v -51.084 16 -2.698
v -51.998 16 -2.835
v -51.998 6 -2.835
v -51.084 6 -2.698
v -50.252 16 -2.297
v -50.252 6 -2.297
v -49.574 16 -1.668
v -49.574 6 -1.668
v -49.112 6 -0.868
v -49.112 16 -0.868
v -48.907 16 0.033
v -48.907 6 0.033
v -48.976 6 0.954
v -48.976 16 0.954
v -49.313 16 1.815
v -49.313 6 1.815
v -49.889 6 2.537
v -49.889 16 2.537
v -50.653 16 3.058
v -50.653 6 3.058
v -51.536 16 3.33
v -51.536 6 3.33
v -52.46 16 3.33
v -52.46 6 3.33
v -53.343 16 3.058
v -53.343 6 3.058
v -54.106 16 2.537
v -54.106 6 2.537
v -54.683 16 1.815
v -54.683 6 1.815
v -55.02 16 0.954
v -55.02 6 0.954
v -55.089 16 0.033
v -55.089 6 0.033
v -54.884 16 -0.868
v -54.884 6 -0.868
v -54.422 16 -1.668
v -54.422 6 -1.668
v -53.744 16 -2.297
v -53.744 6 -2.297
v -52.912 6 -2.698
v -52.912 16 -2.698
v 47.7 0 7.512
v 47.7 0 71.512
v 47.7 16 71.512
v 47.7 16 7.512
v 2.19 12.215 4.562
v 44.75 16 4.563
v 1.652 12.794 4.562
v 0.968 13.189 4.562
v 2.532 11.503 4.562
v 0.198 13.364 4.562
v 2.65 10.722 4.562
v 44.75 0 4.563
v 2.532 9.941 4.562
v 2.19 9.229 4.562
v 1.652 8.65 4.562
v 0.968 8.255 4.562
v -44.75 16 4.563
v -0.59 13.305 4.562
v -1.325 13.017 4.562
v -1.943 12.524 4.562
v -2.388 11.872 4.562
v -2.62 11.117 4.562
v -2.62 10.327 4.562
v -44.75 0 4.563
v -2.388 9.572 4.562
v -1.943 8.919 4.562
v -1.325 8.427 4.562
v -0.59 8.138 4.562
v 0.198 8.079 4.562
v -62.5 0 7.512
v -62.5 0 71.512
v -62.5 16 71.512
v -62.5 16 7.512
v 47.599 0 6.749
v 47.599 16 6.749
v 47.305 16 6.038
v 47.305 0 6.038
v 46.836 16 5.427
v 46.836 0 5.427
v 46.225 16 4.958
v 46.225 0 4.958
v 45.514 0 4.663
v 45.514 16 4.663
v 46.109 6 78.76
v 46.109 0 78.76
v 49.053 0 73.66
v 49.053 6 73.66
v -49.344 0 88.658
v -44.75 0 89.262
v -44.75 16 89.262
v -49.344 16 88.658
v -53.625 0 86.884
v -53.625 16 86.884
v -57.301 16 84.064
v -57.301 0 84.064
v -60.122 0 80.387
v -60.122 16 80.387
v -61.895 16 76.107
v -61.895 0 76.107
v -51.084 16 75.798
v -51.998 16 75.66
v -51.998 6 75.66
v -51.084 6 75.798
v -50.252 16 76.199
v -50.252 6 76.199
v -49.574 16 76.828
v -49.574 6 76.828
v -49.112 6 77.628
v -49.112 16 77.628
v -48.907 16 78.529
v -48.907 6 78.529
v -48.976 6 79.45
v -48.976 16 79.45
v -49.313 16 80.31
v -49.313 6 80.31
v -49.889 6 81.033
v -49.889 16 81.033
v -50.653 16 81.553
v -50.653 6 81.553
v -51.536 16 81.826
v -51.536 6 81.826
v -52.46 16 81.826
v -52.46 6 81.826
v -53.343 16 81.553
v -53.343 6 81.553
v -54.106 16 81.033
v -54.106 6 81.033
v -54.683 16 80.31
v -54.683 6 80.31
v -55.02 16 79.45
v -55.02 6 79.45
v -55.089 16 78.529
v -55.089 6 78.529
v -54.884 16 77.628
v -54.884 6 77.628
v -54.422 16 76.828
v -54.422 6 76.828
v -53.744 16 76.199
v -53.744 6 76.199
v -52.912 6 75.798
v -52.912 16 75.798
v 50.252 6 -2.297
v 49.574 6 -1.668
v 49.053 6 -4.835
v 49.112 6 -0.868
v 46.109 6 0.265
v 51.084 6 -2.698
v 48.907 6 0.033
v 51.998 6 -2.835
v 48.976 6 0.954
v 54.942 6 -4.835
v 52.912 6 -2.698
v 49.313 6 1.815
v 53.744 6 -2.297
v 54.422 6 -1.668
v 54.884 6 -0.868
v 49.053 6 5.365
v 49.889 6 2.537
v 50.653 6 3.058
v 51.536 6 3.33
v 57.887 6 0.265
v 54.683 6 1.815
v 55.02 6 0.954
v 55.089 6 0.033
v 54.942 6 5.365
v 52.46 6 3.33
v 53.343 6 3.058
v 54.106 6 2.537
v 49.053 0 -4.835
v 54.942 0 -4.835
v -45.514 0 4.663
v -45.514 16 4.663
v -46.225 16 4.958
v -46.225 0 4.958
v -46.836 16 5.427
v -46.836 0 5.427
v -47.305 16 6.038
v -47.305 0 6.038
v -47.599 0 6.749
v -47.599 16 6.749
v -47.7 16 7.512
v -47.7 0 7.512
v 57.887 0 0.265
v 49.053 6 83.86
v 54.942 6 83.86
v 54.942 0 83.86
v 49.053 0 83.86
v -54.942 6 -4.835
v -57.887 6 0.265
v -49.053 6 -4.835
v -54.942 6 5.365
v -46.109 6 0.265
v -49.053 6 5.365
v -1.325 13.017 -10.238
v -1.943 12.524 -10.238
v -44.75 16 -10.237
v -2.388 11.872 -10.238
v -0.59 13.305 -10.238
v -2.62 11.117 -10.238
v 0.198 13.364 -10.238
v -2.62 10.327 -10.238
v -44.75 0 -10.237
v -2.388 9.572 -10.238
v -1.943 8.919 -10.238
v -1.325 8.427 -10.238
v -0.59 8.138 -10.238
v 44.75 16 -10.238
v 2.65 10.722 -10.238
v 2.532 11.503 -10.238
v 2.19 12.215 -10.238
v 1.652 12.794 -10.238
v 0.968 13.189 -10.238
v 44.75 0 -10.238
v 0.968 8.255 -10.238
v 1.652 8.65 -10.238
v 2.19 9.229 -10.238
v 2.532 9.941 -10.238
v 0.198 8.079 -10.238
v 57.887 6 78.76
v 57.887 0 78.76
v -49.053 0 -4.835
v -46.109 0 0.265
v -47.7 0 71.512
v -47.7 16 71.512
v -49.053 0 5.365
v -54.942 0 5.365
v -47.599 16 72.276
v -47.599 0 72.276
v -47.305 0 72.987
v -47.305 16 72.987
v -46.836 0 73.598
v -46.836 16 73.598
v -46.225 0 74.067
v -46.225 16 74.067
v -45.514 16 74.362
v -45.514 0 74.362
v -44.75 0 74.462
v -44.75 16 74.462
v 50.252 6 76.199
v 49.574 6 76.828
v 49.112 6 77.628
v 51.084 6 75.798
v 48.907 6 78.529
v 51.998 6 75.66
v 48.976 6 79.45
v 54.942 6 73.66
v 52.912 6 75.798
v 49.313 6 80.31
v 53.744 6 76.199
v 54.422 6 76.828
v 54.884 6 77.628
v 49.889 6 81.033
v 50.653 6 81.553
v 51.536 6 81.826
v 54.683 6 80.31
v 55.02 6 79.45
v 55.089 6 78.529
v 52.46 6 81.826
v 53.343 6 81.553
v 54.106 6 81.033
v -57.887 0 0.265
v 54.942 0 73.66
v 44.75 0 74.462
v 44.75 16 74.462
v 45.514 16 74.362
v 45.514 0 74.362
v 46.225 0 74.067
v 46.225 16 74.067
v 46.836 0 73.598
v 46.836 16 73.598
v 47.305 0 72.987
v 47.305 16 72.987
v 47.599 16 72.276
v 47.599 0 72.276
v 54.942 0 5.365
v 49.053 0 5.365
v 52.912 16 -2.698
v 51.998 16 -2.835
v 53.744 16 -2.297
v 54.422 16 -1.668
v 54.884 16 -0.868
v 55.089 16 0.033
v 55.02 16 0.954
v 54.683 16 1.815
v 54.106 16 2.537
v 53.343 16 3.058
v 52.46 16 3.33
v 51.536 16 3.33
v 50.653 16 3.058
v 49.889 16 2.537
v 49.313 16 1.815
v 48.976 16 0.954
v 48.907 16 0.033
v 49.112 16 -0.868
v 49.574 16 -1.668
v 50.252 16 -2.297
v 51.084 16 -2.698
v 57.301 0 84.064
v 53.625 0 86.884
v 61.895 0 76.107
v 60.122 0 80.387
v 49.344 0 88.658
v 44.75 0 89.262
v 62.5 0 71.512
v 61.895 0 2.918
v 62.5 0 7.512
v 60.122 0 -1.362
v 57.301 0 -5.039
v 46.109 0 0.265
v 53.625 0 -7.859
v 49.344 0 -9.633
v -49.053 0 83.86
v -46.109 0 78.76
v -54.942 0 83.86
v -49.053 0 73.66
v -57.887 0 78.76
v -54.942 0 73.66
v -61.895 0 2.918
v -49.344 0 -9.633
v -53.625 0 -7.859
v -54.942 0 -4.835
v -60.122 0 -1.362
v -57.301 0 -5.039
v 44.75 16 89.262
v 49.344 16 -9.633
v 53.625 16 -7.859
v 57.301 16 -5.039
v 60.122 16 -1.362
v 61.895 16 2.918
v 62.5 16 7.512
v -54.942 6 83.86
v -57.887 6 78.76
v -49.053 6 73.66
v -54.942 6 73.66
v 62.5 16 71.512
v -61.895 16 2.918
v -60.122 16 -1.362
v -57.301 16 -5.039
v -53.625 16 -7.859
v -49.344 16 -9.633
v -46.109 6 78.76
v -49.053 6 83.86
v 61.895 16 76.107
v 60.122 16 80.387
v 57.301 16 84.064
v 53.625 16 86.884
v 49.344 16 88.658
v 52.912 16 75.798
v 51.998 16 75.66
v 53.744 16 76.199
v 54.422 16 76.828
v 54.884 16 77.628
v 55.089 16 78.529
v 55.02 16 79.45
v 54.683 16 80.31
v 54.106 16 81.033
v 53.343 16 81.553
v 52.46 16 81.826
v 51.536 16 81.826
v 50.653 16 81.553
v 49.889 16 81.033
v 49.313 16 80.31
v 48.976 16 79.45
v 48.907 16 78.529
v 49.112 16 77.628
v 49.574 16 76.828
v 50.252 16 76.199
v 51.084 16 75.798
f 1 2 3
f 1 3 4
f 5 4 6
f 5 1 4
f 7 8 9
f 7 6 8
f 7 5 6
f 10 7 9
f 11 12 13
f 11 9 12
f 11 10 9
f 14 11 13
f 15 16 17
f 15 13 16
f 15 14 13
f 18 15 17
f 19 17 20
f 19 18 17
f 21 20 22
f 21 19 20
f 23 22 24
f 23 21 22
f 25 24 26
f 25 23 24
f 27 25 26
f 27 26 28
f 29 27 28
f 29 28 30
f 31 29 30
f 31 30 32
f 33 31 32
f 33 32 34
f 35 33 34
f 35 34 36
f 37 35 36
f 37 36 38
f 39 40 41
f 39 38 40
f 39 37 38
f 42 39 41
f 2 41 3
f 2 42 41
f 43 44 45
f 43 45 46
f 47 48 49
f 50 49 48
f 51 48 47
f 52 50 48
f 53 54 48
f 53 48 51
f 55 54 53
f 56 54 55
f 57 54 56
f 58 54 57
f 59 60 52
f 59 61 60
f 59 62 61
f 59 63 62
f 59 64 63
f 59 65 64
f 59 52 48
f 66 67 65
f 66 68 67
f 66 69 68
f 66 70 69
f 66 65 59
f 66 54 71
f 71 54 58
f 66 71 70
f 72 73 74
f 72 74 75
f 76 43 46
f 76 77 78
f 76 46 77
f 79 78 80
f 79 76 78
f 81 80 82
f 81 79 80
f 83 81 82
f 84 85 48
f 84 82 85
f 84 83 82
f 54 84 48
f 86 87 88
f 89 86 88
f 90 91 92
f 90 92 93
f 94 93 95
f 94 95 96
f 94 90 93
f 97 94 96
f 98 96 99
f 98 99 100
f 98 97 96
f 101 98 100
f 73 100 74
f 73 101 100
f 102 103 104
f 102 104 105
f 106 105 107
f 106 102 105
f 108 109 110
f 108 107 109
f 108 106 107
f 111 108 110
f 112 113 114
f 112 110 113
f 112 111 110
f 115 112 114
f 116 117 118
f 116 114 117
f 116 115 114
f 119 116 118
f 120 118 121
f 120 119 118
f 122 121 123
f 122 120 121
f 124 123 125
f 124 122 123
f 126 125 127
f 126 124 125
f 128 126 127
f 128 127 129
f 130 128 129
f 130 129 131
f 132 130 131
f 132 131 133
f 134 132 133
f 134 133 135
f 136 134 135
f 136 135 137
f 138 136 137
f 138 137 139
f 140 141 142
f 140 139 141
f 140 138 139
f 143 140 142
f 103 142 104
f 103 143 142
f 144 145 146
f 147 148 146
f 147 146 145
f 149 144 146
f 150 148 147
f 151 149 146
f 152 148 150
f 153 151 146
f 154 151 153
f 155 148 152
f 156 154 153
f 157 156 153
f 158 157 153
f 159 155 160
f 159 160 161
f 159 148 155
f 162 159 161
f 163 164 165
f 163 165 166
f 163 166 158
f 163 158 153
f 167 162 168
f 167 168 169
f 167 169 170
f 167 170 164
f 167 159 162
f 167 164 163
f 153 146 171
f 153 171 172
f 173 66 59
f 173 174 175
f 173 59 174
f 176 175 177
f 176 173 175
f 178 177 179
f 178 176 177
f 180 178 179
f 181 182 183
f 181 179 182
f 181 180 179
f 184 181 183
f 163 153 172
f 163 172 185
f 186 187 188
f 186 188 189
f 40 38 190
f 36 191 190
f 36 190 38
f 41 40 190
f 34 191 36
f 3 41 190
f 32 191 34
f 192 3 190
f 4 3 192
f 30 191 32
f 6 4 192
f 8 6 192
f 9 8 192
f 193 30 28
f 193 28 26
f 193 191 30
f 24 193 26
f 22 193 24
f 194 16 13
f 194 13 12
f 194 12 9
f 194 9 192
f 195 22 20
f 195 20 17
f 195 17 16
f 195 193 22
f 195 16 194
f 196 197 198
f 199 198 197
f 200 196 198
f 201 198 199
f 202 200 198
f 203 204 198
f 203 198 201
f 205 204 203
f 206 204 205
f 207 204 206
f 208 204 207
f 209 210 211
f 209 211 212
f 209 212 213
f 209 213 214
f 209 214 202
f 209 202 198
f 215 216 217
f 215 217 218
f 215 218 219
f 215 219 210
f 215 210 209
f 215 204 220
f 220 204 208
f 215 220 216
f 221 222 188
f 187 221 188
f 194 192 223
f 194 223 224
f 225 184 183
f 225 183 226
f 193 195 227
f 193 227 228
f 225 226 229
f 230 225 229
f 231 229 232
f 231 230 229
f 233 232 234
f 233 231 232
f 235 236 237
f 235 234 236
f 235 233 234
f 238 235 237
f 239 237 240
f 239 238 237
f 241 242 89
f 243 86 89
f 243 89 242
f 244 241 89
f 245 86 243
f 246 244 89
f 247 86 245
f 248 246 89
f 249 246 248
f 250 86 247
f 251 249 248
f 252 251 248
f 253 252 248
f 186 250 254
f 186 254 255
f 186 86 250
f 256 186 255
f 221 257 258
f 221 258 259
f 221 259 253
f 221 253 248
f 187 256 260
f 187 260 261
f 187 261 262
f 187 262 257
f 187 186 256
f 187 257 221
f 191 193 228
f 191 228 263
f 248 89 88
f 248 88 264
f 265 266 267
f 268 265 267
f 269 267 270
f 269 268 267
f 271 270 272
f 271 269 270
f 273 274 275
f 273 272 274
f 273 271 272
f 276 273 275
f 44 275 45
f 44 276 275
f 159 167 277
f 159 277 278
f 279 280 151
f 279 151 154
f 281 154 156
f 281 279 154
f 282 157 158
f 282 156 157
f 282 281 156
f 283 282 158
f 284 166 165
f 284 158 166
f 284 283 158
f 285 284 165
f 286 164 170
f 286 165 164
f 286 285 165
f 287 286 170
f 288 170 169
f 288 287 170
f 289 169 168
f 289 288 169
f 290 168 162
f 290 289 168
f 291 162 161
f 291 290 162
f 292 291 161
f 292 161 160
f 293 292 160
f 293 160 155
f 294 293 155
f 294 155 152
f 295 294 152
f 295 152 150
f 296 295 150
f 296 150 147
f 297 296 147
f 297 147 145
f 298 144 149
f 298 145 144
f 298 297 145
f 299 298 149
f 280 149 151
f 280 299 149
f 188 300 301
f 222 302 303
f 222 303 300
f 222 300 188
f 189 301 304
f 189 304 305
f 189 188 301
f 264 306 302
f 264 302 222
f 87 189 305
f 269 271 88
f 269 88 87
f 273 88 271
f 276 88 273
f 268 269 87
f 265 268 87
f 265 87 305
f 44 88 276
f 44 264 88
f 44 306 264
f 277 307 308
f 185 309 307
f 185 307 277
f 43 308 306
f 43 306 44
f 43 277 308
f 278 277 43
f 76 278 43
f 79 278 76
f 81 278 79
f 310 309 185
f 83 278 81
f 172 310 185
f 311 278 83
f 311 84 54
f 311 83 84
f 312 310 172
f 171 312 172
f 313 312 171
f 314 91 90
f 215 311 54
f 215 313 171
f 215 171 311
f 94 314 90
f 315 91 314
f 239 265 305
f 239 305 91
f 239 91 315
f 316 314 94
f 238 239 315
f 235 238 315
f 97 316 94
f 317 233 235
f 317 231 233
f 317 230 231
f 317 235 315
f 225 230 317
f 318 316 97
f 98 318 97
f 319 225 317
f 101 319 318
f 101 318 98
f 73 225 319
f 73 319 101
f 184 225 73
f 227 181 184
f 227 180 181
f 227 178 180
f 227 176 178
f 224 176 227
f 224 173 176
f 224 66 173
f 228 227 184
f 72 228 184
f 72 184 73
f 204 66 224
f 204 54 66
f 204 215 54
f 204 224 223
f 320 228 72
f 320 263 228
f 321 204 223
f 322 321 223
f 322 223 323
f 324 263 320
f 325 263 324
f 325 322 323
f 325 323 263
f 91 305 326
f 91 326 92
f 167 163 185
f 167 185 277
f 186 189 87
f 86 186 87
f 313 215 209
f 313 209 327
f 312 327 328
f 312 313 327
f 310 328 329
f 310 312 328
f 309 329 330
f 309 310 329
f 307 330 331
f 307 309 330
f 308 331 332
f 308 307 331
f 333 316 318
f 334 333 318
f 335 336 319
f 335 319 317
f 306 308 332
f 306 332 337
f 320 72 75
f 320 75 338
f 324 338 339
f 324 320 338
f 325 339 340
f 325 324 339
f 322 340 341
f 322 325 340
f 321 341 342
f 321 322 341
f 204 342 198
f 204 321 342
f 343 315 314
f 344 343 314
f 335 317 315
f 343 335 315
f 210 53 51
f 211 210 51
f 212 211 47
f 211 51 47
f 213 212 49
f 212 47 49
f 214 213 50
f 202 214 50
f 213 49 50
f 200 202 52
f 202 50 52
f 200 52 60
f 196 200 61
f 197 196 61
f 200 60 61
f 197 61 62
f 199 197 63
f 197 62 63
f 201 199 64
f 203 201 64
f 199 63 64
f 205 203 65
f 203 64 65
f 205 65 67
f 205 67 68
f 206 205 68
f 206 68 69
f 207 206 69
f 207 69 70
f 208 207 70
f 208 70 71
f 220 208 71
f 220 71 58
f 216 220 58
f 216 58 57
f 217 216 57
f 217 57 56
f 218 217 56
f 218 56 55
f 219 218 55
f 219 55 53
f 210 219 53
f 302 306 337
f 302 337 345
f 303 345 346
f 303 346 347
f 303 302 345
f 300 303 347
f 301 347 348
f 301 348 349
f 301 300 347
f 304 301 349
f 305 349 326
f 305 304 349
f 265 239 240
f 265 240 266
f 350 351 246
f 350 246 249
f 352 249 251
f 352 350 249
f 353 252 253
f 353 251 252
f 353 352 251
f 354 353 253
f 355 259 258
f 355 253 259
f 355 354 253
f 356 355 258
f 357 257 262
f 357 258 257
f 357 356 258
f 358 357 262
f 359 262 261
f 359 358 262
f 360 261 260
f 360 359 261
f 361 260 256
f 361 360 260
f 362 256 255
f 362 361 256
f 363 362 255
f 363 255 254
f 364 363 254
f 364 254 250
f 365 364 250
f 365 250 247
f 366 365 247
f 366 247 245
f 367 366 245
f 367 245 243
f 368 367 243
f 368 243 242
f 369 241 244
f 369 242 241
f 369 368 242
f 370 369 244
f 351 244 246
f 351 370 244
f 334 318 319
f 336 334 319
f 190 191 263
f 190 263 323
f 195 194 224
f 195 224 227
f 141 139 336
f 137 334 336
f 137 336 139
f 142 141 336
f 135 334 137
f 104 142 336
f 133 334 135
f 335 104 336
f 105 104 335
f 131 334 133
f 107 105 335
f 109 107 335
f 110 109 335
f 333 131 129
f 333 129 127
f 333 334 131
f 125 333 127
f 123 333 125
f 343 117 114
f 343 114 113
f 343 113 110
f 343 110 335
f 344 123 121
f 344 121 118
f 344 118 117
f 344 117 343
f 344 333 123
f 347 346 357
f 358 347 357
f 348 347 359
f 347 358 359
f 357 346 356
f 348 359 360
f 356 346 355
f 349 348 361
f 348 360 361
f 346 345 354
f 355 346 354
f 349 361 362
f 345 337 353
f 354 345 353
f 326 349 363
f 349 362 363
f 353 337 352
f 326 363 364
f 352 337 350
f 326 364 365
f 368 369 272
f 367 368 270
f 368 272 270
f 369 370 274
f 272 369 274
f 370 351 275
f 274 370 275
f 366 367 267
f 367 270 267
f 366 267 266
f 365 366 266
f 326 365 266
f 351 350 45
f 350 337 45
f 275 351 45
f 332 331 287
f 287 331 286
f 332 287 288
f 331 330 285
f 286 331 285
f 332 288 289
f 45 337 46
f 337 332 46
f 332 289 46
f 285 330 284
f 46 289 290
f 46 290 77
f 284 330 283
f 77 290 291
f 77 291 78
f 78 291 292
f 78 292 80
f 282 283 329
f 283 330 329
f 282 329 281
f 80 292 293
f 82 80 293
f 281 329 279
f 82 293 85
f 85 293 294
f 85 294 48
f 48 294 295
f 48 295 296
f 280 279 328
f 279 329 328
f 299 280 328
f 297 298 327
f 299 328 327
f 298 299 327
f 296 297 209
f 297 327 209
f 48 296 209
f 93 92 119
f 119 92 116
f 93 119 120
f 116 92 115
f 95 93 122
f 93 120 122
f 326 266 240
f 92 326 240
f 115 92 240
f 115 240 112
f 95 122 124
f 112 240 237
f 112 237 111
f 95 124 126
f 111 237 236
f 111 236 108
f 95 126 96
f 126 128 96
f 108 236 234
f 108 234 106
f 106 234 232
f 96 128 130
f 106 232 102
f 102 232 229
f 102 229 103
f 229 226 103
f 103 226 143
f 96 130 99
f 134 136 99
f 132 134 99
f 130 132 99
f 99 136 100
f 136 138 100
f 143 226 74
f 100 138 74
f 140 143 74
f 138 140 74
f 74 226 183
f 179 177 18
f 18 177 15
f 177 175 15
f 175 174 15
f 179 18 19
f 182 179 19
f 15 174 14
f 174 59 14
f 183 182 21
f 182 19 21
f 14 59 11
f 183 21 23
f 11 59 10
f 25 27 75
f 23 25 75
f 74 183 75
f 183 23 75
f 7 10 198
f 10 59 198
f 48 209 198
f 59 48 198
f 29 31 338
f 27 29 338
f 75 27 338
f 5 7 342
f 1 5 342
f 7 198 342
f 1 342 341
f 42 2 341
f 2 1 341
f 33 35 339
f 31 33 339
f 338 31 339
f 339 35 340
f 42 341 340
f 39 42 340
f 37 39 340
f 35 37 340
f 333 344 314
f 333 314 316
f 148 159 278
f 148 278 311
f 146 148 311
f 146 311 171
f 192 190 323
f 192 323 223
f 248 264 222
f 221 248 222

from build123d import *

# Parameters (mm, degrees)
BOSS_EXTRUDE1_DEPTH     = 16
SKETCH2_R               = 2.65
CUT_EXTRUDE1_DEPTH      = 20
CUT_EXTRUDE2_DEPTH      = 111.136478545
CUT_EXTRUDE2_DEPTH_BACK = 111.136478545
CUT_EXTRUDE3_DEPTH      = 111.136478545
CUT_EXTRUDE3_DEPTH_BACK = 111.136478545
SKETCH4_R               = 3.1
CUT_EXTRUDE4_DEPTH      = 111.136478545
CUT_EXTRUDE4_DEPTH_BACK = 6


with BuildPart() as part:
    # Sketch1 → Boss-Extrude1 (new body)
    with BuildSketch(Plane(origin=(0, 0, 0), x_dir=(1, 0, 0), z_dir=(0, 1, 0))):
        with BuildLine():
            Line((-44.75, 10.2375), (44.75, 10.2375))
            ThreePointArc((44.75, 10.2375), (57.301145366, 5.038645366), (62.5, -7.5125))
            Line((62.5, -7.5125), (62.5, -71.5125))
            ThreePointArc((62.5, -71.5125), (57.301145366, -84.063645366), (44.75, -89.2625))
            Line((44.75, -89.2625), (-44.75, -89.2625))
            ThreePointArc((-44.75, -89.2625), (-57.301145366, -84.063645366), (-62.5, -71.5125))
            Line((-62.5, -71.5125), (-62.5, -7.5125))
            ThreePointArc((-62.5, -7.5125), (-57.301145366, 5.038645366), (-44.75, 10.2375))
        make_face()
        with BuildLine():
            Line((-47.5, -7.5125), (-47.5, -71.5125))
            ThreePointArc((-47.5, -71.5125), (-46.694543648, -73.457043648), (-44.75, -74.2625))
            Line((-44.75, -74.2625), (44.75, -74.2625))
            ThreePointArc((44.75, -74.2625), (46.694543648, -73.457043648), (47.5, -71.5125))
            Line((47.5, -71.5125), (47.5, -7.5125))
            ThreePointArc((47.5, -7.5125), (46.694543648, -5.567956352), (44.75, -4.7625))
            Line((44.75, -4.7625), (-44.75, -4.7625))
            ThreePointArc((-44.75, -4.7625), (-46.694543648, -5.567956352), (-47.5, -7.5125))
        make_face(mode=Mode.SUBTRACT)
    extrude(amount=BOSS_EXTRUDE1_DEPTH)

    # Sketch2 → Cut-Extrude1 (cut)
    with BuildSketch(Plane.XY.offset(4.7625)):
        with Locations((0, 10.721875)):
            Circle(SKETCH2_R)
    extrude(amount=-CUT_EXTRUDE1_DEPTH, mode=Mode.SUBTRACT)

    # Sketch3 → Cut-Extrude2 (cut, two sides: drawn at the far end of the back side and taken through both)
    with BuildSketch(Plane(origin=(0, 0, 0), x_dir=(1, 0, 0), z_dir=(0, 1, 0)).offset(-CUT_EXTRUDE2_DEPTH_BACK)):
        with BuildLine():
            Line((-47.7, -7.5125), (-47.7, -71.5125))
            ThreePointArc((-47.7, -71.5125), (-46.835965004, -73.598465004), (-44.75, -74.4625))
            Line((-44.75, -74.4625), (44.75, -74.4625))
            ThreePointArc((44.75, -74.4625), (46.835965004, -73.598465004), (47.7, -71.5125))
            Line((47.7, -71.5125), (47.7, -7.5125))
            ThreePointArc((47.7, -7.5125), (46.835965004, -5.426534996), (44.75, -4.5625))
            Line((44.75, -4.5625), (-44.75, -4.5625))
            ThreePointArc((-44.75, -4.5625), (-46.835965004, -5.426534996), (-47.7, -7.5125))
        make_face()
        with BuildLine():
            Line((-44.75, -74.2625), (44.75, -74.2625))
            ThreePointArc((44.75, -74.2625), (46.694543648, -73.457043648), (47.5, -71.5125))
            Line((47.5, -71.5125), (47.5, -7.5125))
            ThreePointArc((47.5, -7.5125), (46.694543648, -5.567956352), (44.75, -4.7625))
            Line((44.75, -4.7625), (-44.75, -4.7625))
            ThreePointArc((-44.75, -4.7625), (-46.694543648, -5.567956352), (-47.5, -7.5125))
            Line((-47.5, -7.5125), (-47.5, -71.5125))
            ThreePointArc((-47.5, -71.5125), (-46.694543648, -73.457043648), (-44.75, -74.2625))
        make_face(mode=Mode.SUBTRACT)
    extrude(amount=CUT_EXTRUDE2_DEPTH + CUT_EXTRUDE2_DEPTH_BACK, mode=Mode.SUBTRACT)

    # Sketch4 → Cut-Extrude3 (cut, two sides: drawn at the far end of the back side and taken through both)
    with BuildSketch(Plane.XZ.offset(-CUT_EXTRUDE3_DEPTH_BACK)):
        with Locations(Location((-51.997844507, 78.760344507, 0), (0, 0, 270))):
            Circle(SKETCH4_R)
        with Locations(Location((51.997844507, 78.760344507, 0), (0, 0, 270))):
            Circle(SKETCH4_R)
        with Locations(Location((51.997844507, 0.264655493, 0), (0, 0, 270))):
            Circle(SKETCH4_R)
        with Locations(Location((-51.997844507, 0.264655493, 0), (0, 0, 270))):
            Circle(SKETCH4_R)
    extrude(amount=CUT_EXTRUDE3_DEPTH + CUT_EXTRUDE3_DEPTH_BACK, mode=Mode.SUBTRACT)

    # Sketch5 → Cut-Extrude4 (cut, two sides: drawn at the far end of the back side and taken through both)
    with BuildSketch(Plane.XZ.offset(-CUT_EXTRUDE4_DEPTH_BACK)):
        Polygon((-46.108871761, 78.760344507), (-49.053358134, 83.860344507), (-54.94233088, 83.860344507), (-57.886817253, 78.760344507), (-54.94233088, 73.660344507), (-49.053358134, 73.660344507), align=None)
        Polygon((57.886817253, 78.760344507), (54.94233088, 83.860344507), (49.053358134, 83.860344507), (46.108871761, 78.760344507), (49.053358134, 73.660344507), (54.94233088, 73.660344507), align=None)
        Polygon((57.886817253, 0.264655493), (54.94233088, 5.364655493), (49.053358134, 5.364655493), (46.108871761, 0.264655493), (49.053358134, -4.835344507), (54.94233088, -4.835344507), align=None)
        Polygon((-46.108871761, 0.264655493), (-49.053358134, 5.364655493), (-54.94233088, 5.364655493), (-57.886817253, 0.264655493), (-54.94233088, -4.835344507), (-49.053358134, -4.835344507), align=None)
    extrude(amount=CUT_EXTRUDE4_DEPTH + CUT_EXTRUDE4_DEPTH_BACK, mode=Mode.SUBTRACT)


solid = part.part
